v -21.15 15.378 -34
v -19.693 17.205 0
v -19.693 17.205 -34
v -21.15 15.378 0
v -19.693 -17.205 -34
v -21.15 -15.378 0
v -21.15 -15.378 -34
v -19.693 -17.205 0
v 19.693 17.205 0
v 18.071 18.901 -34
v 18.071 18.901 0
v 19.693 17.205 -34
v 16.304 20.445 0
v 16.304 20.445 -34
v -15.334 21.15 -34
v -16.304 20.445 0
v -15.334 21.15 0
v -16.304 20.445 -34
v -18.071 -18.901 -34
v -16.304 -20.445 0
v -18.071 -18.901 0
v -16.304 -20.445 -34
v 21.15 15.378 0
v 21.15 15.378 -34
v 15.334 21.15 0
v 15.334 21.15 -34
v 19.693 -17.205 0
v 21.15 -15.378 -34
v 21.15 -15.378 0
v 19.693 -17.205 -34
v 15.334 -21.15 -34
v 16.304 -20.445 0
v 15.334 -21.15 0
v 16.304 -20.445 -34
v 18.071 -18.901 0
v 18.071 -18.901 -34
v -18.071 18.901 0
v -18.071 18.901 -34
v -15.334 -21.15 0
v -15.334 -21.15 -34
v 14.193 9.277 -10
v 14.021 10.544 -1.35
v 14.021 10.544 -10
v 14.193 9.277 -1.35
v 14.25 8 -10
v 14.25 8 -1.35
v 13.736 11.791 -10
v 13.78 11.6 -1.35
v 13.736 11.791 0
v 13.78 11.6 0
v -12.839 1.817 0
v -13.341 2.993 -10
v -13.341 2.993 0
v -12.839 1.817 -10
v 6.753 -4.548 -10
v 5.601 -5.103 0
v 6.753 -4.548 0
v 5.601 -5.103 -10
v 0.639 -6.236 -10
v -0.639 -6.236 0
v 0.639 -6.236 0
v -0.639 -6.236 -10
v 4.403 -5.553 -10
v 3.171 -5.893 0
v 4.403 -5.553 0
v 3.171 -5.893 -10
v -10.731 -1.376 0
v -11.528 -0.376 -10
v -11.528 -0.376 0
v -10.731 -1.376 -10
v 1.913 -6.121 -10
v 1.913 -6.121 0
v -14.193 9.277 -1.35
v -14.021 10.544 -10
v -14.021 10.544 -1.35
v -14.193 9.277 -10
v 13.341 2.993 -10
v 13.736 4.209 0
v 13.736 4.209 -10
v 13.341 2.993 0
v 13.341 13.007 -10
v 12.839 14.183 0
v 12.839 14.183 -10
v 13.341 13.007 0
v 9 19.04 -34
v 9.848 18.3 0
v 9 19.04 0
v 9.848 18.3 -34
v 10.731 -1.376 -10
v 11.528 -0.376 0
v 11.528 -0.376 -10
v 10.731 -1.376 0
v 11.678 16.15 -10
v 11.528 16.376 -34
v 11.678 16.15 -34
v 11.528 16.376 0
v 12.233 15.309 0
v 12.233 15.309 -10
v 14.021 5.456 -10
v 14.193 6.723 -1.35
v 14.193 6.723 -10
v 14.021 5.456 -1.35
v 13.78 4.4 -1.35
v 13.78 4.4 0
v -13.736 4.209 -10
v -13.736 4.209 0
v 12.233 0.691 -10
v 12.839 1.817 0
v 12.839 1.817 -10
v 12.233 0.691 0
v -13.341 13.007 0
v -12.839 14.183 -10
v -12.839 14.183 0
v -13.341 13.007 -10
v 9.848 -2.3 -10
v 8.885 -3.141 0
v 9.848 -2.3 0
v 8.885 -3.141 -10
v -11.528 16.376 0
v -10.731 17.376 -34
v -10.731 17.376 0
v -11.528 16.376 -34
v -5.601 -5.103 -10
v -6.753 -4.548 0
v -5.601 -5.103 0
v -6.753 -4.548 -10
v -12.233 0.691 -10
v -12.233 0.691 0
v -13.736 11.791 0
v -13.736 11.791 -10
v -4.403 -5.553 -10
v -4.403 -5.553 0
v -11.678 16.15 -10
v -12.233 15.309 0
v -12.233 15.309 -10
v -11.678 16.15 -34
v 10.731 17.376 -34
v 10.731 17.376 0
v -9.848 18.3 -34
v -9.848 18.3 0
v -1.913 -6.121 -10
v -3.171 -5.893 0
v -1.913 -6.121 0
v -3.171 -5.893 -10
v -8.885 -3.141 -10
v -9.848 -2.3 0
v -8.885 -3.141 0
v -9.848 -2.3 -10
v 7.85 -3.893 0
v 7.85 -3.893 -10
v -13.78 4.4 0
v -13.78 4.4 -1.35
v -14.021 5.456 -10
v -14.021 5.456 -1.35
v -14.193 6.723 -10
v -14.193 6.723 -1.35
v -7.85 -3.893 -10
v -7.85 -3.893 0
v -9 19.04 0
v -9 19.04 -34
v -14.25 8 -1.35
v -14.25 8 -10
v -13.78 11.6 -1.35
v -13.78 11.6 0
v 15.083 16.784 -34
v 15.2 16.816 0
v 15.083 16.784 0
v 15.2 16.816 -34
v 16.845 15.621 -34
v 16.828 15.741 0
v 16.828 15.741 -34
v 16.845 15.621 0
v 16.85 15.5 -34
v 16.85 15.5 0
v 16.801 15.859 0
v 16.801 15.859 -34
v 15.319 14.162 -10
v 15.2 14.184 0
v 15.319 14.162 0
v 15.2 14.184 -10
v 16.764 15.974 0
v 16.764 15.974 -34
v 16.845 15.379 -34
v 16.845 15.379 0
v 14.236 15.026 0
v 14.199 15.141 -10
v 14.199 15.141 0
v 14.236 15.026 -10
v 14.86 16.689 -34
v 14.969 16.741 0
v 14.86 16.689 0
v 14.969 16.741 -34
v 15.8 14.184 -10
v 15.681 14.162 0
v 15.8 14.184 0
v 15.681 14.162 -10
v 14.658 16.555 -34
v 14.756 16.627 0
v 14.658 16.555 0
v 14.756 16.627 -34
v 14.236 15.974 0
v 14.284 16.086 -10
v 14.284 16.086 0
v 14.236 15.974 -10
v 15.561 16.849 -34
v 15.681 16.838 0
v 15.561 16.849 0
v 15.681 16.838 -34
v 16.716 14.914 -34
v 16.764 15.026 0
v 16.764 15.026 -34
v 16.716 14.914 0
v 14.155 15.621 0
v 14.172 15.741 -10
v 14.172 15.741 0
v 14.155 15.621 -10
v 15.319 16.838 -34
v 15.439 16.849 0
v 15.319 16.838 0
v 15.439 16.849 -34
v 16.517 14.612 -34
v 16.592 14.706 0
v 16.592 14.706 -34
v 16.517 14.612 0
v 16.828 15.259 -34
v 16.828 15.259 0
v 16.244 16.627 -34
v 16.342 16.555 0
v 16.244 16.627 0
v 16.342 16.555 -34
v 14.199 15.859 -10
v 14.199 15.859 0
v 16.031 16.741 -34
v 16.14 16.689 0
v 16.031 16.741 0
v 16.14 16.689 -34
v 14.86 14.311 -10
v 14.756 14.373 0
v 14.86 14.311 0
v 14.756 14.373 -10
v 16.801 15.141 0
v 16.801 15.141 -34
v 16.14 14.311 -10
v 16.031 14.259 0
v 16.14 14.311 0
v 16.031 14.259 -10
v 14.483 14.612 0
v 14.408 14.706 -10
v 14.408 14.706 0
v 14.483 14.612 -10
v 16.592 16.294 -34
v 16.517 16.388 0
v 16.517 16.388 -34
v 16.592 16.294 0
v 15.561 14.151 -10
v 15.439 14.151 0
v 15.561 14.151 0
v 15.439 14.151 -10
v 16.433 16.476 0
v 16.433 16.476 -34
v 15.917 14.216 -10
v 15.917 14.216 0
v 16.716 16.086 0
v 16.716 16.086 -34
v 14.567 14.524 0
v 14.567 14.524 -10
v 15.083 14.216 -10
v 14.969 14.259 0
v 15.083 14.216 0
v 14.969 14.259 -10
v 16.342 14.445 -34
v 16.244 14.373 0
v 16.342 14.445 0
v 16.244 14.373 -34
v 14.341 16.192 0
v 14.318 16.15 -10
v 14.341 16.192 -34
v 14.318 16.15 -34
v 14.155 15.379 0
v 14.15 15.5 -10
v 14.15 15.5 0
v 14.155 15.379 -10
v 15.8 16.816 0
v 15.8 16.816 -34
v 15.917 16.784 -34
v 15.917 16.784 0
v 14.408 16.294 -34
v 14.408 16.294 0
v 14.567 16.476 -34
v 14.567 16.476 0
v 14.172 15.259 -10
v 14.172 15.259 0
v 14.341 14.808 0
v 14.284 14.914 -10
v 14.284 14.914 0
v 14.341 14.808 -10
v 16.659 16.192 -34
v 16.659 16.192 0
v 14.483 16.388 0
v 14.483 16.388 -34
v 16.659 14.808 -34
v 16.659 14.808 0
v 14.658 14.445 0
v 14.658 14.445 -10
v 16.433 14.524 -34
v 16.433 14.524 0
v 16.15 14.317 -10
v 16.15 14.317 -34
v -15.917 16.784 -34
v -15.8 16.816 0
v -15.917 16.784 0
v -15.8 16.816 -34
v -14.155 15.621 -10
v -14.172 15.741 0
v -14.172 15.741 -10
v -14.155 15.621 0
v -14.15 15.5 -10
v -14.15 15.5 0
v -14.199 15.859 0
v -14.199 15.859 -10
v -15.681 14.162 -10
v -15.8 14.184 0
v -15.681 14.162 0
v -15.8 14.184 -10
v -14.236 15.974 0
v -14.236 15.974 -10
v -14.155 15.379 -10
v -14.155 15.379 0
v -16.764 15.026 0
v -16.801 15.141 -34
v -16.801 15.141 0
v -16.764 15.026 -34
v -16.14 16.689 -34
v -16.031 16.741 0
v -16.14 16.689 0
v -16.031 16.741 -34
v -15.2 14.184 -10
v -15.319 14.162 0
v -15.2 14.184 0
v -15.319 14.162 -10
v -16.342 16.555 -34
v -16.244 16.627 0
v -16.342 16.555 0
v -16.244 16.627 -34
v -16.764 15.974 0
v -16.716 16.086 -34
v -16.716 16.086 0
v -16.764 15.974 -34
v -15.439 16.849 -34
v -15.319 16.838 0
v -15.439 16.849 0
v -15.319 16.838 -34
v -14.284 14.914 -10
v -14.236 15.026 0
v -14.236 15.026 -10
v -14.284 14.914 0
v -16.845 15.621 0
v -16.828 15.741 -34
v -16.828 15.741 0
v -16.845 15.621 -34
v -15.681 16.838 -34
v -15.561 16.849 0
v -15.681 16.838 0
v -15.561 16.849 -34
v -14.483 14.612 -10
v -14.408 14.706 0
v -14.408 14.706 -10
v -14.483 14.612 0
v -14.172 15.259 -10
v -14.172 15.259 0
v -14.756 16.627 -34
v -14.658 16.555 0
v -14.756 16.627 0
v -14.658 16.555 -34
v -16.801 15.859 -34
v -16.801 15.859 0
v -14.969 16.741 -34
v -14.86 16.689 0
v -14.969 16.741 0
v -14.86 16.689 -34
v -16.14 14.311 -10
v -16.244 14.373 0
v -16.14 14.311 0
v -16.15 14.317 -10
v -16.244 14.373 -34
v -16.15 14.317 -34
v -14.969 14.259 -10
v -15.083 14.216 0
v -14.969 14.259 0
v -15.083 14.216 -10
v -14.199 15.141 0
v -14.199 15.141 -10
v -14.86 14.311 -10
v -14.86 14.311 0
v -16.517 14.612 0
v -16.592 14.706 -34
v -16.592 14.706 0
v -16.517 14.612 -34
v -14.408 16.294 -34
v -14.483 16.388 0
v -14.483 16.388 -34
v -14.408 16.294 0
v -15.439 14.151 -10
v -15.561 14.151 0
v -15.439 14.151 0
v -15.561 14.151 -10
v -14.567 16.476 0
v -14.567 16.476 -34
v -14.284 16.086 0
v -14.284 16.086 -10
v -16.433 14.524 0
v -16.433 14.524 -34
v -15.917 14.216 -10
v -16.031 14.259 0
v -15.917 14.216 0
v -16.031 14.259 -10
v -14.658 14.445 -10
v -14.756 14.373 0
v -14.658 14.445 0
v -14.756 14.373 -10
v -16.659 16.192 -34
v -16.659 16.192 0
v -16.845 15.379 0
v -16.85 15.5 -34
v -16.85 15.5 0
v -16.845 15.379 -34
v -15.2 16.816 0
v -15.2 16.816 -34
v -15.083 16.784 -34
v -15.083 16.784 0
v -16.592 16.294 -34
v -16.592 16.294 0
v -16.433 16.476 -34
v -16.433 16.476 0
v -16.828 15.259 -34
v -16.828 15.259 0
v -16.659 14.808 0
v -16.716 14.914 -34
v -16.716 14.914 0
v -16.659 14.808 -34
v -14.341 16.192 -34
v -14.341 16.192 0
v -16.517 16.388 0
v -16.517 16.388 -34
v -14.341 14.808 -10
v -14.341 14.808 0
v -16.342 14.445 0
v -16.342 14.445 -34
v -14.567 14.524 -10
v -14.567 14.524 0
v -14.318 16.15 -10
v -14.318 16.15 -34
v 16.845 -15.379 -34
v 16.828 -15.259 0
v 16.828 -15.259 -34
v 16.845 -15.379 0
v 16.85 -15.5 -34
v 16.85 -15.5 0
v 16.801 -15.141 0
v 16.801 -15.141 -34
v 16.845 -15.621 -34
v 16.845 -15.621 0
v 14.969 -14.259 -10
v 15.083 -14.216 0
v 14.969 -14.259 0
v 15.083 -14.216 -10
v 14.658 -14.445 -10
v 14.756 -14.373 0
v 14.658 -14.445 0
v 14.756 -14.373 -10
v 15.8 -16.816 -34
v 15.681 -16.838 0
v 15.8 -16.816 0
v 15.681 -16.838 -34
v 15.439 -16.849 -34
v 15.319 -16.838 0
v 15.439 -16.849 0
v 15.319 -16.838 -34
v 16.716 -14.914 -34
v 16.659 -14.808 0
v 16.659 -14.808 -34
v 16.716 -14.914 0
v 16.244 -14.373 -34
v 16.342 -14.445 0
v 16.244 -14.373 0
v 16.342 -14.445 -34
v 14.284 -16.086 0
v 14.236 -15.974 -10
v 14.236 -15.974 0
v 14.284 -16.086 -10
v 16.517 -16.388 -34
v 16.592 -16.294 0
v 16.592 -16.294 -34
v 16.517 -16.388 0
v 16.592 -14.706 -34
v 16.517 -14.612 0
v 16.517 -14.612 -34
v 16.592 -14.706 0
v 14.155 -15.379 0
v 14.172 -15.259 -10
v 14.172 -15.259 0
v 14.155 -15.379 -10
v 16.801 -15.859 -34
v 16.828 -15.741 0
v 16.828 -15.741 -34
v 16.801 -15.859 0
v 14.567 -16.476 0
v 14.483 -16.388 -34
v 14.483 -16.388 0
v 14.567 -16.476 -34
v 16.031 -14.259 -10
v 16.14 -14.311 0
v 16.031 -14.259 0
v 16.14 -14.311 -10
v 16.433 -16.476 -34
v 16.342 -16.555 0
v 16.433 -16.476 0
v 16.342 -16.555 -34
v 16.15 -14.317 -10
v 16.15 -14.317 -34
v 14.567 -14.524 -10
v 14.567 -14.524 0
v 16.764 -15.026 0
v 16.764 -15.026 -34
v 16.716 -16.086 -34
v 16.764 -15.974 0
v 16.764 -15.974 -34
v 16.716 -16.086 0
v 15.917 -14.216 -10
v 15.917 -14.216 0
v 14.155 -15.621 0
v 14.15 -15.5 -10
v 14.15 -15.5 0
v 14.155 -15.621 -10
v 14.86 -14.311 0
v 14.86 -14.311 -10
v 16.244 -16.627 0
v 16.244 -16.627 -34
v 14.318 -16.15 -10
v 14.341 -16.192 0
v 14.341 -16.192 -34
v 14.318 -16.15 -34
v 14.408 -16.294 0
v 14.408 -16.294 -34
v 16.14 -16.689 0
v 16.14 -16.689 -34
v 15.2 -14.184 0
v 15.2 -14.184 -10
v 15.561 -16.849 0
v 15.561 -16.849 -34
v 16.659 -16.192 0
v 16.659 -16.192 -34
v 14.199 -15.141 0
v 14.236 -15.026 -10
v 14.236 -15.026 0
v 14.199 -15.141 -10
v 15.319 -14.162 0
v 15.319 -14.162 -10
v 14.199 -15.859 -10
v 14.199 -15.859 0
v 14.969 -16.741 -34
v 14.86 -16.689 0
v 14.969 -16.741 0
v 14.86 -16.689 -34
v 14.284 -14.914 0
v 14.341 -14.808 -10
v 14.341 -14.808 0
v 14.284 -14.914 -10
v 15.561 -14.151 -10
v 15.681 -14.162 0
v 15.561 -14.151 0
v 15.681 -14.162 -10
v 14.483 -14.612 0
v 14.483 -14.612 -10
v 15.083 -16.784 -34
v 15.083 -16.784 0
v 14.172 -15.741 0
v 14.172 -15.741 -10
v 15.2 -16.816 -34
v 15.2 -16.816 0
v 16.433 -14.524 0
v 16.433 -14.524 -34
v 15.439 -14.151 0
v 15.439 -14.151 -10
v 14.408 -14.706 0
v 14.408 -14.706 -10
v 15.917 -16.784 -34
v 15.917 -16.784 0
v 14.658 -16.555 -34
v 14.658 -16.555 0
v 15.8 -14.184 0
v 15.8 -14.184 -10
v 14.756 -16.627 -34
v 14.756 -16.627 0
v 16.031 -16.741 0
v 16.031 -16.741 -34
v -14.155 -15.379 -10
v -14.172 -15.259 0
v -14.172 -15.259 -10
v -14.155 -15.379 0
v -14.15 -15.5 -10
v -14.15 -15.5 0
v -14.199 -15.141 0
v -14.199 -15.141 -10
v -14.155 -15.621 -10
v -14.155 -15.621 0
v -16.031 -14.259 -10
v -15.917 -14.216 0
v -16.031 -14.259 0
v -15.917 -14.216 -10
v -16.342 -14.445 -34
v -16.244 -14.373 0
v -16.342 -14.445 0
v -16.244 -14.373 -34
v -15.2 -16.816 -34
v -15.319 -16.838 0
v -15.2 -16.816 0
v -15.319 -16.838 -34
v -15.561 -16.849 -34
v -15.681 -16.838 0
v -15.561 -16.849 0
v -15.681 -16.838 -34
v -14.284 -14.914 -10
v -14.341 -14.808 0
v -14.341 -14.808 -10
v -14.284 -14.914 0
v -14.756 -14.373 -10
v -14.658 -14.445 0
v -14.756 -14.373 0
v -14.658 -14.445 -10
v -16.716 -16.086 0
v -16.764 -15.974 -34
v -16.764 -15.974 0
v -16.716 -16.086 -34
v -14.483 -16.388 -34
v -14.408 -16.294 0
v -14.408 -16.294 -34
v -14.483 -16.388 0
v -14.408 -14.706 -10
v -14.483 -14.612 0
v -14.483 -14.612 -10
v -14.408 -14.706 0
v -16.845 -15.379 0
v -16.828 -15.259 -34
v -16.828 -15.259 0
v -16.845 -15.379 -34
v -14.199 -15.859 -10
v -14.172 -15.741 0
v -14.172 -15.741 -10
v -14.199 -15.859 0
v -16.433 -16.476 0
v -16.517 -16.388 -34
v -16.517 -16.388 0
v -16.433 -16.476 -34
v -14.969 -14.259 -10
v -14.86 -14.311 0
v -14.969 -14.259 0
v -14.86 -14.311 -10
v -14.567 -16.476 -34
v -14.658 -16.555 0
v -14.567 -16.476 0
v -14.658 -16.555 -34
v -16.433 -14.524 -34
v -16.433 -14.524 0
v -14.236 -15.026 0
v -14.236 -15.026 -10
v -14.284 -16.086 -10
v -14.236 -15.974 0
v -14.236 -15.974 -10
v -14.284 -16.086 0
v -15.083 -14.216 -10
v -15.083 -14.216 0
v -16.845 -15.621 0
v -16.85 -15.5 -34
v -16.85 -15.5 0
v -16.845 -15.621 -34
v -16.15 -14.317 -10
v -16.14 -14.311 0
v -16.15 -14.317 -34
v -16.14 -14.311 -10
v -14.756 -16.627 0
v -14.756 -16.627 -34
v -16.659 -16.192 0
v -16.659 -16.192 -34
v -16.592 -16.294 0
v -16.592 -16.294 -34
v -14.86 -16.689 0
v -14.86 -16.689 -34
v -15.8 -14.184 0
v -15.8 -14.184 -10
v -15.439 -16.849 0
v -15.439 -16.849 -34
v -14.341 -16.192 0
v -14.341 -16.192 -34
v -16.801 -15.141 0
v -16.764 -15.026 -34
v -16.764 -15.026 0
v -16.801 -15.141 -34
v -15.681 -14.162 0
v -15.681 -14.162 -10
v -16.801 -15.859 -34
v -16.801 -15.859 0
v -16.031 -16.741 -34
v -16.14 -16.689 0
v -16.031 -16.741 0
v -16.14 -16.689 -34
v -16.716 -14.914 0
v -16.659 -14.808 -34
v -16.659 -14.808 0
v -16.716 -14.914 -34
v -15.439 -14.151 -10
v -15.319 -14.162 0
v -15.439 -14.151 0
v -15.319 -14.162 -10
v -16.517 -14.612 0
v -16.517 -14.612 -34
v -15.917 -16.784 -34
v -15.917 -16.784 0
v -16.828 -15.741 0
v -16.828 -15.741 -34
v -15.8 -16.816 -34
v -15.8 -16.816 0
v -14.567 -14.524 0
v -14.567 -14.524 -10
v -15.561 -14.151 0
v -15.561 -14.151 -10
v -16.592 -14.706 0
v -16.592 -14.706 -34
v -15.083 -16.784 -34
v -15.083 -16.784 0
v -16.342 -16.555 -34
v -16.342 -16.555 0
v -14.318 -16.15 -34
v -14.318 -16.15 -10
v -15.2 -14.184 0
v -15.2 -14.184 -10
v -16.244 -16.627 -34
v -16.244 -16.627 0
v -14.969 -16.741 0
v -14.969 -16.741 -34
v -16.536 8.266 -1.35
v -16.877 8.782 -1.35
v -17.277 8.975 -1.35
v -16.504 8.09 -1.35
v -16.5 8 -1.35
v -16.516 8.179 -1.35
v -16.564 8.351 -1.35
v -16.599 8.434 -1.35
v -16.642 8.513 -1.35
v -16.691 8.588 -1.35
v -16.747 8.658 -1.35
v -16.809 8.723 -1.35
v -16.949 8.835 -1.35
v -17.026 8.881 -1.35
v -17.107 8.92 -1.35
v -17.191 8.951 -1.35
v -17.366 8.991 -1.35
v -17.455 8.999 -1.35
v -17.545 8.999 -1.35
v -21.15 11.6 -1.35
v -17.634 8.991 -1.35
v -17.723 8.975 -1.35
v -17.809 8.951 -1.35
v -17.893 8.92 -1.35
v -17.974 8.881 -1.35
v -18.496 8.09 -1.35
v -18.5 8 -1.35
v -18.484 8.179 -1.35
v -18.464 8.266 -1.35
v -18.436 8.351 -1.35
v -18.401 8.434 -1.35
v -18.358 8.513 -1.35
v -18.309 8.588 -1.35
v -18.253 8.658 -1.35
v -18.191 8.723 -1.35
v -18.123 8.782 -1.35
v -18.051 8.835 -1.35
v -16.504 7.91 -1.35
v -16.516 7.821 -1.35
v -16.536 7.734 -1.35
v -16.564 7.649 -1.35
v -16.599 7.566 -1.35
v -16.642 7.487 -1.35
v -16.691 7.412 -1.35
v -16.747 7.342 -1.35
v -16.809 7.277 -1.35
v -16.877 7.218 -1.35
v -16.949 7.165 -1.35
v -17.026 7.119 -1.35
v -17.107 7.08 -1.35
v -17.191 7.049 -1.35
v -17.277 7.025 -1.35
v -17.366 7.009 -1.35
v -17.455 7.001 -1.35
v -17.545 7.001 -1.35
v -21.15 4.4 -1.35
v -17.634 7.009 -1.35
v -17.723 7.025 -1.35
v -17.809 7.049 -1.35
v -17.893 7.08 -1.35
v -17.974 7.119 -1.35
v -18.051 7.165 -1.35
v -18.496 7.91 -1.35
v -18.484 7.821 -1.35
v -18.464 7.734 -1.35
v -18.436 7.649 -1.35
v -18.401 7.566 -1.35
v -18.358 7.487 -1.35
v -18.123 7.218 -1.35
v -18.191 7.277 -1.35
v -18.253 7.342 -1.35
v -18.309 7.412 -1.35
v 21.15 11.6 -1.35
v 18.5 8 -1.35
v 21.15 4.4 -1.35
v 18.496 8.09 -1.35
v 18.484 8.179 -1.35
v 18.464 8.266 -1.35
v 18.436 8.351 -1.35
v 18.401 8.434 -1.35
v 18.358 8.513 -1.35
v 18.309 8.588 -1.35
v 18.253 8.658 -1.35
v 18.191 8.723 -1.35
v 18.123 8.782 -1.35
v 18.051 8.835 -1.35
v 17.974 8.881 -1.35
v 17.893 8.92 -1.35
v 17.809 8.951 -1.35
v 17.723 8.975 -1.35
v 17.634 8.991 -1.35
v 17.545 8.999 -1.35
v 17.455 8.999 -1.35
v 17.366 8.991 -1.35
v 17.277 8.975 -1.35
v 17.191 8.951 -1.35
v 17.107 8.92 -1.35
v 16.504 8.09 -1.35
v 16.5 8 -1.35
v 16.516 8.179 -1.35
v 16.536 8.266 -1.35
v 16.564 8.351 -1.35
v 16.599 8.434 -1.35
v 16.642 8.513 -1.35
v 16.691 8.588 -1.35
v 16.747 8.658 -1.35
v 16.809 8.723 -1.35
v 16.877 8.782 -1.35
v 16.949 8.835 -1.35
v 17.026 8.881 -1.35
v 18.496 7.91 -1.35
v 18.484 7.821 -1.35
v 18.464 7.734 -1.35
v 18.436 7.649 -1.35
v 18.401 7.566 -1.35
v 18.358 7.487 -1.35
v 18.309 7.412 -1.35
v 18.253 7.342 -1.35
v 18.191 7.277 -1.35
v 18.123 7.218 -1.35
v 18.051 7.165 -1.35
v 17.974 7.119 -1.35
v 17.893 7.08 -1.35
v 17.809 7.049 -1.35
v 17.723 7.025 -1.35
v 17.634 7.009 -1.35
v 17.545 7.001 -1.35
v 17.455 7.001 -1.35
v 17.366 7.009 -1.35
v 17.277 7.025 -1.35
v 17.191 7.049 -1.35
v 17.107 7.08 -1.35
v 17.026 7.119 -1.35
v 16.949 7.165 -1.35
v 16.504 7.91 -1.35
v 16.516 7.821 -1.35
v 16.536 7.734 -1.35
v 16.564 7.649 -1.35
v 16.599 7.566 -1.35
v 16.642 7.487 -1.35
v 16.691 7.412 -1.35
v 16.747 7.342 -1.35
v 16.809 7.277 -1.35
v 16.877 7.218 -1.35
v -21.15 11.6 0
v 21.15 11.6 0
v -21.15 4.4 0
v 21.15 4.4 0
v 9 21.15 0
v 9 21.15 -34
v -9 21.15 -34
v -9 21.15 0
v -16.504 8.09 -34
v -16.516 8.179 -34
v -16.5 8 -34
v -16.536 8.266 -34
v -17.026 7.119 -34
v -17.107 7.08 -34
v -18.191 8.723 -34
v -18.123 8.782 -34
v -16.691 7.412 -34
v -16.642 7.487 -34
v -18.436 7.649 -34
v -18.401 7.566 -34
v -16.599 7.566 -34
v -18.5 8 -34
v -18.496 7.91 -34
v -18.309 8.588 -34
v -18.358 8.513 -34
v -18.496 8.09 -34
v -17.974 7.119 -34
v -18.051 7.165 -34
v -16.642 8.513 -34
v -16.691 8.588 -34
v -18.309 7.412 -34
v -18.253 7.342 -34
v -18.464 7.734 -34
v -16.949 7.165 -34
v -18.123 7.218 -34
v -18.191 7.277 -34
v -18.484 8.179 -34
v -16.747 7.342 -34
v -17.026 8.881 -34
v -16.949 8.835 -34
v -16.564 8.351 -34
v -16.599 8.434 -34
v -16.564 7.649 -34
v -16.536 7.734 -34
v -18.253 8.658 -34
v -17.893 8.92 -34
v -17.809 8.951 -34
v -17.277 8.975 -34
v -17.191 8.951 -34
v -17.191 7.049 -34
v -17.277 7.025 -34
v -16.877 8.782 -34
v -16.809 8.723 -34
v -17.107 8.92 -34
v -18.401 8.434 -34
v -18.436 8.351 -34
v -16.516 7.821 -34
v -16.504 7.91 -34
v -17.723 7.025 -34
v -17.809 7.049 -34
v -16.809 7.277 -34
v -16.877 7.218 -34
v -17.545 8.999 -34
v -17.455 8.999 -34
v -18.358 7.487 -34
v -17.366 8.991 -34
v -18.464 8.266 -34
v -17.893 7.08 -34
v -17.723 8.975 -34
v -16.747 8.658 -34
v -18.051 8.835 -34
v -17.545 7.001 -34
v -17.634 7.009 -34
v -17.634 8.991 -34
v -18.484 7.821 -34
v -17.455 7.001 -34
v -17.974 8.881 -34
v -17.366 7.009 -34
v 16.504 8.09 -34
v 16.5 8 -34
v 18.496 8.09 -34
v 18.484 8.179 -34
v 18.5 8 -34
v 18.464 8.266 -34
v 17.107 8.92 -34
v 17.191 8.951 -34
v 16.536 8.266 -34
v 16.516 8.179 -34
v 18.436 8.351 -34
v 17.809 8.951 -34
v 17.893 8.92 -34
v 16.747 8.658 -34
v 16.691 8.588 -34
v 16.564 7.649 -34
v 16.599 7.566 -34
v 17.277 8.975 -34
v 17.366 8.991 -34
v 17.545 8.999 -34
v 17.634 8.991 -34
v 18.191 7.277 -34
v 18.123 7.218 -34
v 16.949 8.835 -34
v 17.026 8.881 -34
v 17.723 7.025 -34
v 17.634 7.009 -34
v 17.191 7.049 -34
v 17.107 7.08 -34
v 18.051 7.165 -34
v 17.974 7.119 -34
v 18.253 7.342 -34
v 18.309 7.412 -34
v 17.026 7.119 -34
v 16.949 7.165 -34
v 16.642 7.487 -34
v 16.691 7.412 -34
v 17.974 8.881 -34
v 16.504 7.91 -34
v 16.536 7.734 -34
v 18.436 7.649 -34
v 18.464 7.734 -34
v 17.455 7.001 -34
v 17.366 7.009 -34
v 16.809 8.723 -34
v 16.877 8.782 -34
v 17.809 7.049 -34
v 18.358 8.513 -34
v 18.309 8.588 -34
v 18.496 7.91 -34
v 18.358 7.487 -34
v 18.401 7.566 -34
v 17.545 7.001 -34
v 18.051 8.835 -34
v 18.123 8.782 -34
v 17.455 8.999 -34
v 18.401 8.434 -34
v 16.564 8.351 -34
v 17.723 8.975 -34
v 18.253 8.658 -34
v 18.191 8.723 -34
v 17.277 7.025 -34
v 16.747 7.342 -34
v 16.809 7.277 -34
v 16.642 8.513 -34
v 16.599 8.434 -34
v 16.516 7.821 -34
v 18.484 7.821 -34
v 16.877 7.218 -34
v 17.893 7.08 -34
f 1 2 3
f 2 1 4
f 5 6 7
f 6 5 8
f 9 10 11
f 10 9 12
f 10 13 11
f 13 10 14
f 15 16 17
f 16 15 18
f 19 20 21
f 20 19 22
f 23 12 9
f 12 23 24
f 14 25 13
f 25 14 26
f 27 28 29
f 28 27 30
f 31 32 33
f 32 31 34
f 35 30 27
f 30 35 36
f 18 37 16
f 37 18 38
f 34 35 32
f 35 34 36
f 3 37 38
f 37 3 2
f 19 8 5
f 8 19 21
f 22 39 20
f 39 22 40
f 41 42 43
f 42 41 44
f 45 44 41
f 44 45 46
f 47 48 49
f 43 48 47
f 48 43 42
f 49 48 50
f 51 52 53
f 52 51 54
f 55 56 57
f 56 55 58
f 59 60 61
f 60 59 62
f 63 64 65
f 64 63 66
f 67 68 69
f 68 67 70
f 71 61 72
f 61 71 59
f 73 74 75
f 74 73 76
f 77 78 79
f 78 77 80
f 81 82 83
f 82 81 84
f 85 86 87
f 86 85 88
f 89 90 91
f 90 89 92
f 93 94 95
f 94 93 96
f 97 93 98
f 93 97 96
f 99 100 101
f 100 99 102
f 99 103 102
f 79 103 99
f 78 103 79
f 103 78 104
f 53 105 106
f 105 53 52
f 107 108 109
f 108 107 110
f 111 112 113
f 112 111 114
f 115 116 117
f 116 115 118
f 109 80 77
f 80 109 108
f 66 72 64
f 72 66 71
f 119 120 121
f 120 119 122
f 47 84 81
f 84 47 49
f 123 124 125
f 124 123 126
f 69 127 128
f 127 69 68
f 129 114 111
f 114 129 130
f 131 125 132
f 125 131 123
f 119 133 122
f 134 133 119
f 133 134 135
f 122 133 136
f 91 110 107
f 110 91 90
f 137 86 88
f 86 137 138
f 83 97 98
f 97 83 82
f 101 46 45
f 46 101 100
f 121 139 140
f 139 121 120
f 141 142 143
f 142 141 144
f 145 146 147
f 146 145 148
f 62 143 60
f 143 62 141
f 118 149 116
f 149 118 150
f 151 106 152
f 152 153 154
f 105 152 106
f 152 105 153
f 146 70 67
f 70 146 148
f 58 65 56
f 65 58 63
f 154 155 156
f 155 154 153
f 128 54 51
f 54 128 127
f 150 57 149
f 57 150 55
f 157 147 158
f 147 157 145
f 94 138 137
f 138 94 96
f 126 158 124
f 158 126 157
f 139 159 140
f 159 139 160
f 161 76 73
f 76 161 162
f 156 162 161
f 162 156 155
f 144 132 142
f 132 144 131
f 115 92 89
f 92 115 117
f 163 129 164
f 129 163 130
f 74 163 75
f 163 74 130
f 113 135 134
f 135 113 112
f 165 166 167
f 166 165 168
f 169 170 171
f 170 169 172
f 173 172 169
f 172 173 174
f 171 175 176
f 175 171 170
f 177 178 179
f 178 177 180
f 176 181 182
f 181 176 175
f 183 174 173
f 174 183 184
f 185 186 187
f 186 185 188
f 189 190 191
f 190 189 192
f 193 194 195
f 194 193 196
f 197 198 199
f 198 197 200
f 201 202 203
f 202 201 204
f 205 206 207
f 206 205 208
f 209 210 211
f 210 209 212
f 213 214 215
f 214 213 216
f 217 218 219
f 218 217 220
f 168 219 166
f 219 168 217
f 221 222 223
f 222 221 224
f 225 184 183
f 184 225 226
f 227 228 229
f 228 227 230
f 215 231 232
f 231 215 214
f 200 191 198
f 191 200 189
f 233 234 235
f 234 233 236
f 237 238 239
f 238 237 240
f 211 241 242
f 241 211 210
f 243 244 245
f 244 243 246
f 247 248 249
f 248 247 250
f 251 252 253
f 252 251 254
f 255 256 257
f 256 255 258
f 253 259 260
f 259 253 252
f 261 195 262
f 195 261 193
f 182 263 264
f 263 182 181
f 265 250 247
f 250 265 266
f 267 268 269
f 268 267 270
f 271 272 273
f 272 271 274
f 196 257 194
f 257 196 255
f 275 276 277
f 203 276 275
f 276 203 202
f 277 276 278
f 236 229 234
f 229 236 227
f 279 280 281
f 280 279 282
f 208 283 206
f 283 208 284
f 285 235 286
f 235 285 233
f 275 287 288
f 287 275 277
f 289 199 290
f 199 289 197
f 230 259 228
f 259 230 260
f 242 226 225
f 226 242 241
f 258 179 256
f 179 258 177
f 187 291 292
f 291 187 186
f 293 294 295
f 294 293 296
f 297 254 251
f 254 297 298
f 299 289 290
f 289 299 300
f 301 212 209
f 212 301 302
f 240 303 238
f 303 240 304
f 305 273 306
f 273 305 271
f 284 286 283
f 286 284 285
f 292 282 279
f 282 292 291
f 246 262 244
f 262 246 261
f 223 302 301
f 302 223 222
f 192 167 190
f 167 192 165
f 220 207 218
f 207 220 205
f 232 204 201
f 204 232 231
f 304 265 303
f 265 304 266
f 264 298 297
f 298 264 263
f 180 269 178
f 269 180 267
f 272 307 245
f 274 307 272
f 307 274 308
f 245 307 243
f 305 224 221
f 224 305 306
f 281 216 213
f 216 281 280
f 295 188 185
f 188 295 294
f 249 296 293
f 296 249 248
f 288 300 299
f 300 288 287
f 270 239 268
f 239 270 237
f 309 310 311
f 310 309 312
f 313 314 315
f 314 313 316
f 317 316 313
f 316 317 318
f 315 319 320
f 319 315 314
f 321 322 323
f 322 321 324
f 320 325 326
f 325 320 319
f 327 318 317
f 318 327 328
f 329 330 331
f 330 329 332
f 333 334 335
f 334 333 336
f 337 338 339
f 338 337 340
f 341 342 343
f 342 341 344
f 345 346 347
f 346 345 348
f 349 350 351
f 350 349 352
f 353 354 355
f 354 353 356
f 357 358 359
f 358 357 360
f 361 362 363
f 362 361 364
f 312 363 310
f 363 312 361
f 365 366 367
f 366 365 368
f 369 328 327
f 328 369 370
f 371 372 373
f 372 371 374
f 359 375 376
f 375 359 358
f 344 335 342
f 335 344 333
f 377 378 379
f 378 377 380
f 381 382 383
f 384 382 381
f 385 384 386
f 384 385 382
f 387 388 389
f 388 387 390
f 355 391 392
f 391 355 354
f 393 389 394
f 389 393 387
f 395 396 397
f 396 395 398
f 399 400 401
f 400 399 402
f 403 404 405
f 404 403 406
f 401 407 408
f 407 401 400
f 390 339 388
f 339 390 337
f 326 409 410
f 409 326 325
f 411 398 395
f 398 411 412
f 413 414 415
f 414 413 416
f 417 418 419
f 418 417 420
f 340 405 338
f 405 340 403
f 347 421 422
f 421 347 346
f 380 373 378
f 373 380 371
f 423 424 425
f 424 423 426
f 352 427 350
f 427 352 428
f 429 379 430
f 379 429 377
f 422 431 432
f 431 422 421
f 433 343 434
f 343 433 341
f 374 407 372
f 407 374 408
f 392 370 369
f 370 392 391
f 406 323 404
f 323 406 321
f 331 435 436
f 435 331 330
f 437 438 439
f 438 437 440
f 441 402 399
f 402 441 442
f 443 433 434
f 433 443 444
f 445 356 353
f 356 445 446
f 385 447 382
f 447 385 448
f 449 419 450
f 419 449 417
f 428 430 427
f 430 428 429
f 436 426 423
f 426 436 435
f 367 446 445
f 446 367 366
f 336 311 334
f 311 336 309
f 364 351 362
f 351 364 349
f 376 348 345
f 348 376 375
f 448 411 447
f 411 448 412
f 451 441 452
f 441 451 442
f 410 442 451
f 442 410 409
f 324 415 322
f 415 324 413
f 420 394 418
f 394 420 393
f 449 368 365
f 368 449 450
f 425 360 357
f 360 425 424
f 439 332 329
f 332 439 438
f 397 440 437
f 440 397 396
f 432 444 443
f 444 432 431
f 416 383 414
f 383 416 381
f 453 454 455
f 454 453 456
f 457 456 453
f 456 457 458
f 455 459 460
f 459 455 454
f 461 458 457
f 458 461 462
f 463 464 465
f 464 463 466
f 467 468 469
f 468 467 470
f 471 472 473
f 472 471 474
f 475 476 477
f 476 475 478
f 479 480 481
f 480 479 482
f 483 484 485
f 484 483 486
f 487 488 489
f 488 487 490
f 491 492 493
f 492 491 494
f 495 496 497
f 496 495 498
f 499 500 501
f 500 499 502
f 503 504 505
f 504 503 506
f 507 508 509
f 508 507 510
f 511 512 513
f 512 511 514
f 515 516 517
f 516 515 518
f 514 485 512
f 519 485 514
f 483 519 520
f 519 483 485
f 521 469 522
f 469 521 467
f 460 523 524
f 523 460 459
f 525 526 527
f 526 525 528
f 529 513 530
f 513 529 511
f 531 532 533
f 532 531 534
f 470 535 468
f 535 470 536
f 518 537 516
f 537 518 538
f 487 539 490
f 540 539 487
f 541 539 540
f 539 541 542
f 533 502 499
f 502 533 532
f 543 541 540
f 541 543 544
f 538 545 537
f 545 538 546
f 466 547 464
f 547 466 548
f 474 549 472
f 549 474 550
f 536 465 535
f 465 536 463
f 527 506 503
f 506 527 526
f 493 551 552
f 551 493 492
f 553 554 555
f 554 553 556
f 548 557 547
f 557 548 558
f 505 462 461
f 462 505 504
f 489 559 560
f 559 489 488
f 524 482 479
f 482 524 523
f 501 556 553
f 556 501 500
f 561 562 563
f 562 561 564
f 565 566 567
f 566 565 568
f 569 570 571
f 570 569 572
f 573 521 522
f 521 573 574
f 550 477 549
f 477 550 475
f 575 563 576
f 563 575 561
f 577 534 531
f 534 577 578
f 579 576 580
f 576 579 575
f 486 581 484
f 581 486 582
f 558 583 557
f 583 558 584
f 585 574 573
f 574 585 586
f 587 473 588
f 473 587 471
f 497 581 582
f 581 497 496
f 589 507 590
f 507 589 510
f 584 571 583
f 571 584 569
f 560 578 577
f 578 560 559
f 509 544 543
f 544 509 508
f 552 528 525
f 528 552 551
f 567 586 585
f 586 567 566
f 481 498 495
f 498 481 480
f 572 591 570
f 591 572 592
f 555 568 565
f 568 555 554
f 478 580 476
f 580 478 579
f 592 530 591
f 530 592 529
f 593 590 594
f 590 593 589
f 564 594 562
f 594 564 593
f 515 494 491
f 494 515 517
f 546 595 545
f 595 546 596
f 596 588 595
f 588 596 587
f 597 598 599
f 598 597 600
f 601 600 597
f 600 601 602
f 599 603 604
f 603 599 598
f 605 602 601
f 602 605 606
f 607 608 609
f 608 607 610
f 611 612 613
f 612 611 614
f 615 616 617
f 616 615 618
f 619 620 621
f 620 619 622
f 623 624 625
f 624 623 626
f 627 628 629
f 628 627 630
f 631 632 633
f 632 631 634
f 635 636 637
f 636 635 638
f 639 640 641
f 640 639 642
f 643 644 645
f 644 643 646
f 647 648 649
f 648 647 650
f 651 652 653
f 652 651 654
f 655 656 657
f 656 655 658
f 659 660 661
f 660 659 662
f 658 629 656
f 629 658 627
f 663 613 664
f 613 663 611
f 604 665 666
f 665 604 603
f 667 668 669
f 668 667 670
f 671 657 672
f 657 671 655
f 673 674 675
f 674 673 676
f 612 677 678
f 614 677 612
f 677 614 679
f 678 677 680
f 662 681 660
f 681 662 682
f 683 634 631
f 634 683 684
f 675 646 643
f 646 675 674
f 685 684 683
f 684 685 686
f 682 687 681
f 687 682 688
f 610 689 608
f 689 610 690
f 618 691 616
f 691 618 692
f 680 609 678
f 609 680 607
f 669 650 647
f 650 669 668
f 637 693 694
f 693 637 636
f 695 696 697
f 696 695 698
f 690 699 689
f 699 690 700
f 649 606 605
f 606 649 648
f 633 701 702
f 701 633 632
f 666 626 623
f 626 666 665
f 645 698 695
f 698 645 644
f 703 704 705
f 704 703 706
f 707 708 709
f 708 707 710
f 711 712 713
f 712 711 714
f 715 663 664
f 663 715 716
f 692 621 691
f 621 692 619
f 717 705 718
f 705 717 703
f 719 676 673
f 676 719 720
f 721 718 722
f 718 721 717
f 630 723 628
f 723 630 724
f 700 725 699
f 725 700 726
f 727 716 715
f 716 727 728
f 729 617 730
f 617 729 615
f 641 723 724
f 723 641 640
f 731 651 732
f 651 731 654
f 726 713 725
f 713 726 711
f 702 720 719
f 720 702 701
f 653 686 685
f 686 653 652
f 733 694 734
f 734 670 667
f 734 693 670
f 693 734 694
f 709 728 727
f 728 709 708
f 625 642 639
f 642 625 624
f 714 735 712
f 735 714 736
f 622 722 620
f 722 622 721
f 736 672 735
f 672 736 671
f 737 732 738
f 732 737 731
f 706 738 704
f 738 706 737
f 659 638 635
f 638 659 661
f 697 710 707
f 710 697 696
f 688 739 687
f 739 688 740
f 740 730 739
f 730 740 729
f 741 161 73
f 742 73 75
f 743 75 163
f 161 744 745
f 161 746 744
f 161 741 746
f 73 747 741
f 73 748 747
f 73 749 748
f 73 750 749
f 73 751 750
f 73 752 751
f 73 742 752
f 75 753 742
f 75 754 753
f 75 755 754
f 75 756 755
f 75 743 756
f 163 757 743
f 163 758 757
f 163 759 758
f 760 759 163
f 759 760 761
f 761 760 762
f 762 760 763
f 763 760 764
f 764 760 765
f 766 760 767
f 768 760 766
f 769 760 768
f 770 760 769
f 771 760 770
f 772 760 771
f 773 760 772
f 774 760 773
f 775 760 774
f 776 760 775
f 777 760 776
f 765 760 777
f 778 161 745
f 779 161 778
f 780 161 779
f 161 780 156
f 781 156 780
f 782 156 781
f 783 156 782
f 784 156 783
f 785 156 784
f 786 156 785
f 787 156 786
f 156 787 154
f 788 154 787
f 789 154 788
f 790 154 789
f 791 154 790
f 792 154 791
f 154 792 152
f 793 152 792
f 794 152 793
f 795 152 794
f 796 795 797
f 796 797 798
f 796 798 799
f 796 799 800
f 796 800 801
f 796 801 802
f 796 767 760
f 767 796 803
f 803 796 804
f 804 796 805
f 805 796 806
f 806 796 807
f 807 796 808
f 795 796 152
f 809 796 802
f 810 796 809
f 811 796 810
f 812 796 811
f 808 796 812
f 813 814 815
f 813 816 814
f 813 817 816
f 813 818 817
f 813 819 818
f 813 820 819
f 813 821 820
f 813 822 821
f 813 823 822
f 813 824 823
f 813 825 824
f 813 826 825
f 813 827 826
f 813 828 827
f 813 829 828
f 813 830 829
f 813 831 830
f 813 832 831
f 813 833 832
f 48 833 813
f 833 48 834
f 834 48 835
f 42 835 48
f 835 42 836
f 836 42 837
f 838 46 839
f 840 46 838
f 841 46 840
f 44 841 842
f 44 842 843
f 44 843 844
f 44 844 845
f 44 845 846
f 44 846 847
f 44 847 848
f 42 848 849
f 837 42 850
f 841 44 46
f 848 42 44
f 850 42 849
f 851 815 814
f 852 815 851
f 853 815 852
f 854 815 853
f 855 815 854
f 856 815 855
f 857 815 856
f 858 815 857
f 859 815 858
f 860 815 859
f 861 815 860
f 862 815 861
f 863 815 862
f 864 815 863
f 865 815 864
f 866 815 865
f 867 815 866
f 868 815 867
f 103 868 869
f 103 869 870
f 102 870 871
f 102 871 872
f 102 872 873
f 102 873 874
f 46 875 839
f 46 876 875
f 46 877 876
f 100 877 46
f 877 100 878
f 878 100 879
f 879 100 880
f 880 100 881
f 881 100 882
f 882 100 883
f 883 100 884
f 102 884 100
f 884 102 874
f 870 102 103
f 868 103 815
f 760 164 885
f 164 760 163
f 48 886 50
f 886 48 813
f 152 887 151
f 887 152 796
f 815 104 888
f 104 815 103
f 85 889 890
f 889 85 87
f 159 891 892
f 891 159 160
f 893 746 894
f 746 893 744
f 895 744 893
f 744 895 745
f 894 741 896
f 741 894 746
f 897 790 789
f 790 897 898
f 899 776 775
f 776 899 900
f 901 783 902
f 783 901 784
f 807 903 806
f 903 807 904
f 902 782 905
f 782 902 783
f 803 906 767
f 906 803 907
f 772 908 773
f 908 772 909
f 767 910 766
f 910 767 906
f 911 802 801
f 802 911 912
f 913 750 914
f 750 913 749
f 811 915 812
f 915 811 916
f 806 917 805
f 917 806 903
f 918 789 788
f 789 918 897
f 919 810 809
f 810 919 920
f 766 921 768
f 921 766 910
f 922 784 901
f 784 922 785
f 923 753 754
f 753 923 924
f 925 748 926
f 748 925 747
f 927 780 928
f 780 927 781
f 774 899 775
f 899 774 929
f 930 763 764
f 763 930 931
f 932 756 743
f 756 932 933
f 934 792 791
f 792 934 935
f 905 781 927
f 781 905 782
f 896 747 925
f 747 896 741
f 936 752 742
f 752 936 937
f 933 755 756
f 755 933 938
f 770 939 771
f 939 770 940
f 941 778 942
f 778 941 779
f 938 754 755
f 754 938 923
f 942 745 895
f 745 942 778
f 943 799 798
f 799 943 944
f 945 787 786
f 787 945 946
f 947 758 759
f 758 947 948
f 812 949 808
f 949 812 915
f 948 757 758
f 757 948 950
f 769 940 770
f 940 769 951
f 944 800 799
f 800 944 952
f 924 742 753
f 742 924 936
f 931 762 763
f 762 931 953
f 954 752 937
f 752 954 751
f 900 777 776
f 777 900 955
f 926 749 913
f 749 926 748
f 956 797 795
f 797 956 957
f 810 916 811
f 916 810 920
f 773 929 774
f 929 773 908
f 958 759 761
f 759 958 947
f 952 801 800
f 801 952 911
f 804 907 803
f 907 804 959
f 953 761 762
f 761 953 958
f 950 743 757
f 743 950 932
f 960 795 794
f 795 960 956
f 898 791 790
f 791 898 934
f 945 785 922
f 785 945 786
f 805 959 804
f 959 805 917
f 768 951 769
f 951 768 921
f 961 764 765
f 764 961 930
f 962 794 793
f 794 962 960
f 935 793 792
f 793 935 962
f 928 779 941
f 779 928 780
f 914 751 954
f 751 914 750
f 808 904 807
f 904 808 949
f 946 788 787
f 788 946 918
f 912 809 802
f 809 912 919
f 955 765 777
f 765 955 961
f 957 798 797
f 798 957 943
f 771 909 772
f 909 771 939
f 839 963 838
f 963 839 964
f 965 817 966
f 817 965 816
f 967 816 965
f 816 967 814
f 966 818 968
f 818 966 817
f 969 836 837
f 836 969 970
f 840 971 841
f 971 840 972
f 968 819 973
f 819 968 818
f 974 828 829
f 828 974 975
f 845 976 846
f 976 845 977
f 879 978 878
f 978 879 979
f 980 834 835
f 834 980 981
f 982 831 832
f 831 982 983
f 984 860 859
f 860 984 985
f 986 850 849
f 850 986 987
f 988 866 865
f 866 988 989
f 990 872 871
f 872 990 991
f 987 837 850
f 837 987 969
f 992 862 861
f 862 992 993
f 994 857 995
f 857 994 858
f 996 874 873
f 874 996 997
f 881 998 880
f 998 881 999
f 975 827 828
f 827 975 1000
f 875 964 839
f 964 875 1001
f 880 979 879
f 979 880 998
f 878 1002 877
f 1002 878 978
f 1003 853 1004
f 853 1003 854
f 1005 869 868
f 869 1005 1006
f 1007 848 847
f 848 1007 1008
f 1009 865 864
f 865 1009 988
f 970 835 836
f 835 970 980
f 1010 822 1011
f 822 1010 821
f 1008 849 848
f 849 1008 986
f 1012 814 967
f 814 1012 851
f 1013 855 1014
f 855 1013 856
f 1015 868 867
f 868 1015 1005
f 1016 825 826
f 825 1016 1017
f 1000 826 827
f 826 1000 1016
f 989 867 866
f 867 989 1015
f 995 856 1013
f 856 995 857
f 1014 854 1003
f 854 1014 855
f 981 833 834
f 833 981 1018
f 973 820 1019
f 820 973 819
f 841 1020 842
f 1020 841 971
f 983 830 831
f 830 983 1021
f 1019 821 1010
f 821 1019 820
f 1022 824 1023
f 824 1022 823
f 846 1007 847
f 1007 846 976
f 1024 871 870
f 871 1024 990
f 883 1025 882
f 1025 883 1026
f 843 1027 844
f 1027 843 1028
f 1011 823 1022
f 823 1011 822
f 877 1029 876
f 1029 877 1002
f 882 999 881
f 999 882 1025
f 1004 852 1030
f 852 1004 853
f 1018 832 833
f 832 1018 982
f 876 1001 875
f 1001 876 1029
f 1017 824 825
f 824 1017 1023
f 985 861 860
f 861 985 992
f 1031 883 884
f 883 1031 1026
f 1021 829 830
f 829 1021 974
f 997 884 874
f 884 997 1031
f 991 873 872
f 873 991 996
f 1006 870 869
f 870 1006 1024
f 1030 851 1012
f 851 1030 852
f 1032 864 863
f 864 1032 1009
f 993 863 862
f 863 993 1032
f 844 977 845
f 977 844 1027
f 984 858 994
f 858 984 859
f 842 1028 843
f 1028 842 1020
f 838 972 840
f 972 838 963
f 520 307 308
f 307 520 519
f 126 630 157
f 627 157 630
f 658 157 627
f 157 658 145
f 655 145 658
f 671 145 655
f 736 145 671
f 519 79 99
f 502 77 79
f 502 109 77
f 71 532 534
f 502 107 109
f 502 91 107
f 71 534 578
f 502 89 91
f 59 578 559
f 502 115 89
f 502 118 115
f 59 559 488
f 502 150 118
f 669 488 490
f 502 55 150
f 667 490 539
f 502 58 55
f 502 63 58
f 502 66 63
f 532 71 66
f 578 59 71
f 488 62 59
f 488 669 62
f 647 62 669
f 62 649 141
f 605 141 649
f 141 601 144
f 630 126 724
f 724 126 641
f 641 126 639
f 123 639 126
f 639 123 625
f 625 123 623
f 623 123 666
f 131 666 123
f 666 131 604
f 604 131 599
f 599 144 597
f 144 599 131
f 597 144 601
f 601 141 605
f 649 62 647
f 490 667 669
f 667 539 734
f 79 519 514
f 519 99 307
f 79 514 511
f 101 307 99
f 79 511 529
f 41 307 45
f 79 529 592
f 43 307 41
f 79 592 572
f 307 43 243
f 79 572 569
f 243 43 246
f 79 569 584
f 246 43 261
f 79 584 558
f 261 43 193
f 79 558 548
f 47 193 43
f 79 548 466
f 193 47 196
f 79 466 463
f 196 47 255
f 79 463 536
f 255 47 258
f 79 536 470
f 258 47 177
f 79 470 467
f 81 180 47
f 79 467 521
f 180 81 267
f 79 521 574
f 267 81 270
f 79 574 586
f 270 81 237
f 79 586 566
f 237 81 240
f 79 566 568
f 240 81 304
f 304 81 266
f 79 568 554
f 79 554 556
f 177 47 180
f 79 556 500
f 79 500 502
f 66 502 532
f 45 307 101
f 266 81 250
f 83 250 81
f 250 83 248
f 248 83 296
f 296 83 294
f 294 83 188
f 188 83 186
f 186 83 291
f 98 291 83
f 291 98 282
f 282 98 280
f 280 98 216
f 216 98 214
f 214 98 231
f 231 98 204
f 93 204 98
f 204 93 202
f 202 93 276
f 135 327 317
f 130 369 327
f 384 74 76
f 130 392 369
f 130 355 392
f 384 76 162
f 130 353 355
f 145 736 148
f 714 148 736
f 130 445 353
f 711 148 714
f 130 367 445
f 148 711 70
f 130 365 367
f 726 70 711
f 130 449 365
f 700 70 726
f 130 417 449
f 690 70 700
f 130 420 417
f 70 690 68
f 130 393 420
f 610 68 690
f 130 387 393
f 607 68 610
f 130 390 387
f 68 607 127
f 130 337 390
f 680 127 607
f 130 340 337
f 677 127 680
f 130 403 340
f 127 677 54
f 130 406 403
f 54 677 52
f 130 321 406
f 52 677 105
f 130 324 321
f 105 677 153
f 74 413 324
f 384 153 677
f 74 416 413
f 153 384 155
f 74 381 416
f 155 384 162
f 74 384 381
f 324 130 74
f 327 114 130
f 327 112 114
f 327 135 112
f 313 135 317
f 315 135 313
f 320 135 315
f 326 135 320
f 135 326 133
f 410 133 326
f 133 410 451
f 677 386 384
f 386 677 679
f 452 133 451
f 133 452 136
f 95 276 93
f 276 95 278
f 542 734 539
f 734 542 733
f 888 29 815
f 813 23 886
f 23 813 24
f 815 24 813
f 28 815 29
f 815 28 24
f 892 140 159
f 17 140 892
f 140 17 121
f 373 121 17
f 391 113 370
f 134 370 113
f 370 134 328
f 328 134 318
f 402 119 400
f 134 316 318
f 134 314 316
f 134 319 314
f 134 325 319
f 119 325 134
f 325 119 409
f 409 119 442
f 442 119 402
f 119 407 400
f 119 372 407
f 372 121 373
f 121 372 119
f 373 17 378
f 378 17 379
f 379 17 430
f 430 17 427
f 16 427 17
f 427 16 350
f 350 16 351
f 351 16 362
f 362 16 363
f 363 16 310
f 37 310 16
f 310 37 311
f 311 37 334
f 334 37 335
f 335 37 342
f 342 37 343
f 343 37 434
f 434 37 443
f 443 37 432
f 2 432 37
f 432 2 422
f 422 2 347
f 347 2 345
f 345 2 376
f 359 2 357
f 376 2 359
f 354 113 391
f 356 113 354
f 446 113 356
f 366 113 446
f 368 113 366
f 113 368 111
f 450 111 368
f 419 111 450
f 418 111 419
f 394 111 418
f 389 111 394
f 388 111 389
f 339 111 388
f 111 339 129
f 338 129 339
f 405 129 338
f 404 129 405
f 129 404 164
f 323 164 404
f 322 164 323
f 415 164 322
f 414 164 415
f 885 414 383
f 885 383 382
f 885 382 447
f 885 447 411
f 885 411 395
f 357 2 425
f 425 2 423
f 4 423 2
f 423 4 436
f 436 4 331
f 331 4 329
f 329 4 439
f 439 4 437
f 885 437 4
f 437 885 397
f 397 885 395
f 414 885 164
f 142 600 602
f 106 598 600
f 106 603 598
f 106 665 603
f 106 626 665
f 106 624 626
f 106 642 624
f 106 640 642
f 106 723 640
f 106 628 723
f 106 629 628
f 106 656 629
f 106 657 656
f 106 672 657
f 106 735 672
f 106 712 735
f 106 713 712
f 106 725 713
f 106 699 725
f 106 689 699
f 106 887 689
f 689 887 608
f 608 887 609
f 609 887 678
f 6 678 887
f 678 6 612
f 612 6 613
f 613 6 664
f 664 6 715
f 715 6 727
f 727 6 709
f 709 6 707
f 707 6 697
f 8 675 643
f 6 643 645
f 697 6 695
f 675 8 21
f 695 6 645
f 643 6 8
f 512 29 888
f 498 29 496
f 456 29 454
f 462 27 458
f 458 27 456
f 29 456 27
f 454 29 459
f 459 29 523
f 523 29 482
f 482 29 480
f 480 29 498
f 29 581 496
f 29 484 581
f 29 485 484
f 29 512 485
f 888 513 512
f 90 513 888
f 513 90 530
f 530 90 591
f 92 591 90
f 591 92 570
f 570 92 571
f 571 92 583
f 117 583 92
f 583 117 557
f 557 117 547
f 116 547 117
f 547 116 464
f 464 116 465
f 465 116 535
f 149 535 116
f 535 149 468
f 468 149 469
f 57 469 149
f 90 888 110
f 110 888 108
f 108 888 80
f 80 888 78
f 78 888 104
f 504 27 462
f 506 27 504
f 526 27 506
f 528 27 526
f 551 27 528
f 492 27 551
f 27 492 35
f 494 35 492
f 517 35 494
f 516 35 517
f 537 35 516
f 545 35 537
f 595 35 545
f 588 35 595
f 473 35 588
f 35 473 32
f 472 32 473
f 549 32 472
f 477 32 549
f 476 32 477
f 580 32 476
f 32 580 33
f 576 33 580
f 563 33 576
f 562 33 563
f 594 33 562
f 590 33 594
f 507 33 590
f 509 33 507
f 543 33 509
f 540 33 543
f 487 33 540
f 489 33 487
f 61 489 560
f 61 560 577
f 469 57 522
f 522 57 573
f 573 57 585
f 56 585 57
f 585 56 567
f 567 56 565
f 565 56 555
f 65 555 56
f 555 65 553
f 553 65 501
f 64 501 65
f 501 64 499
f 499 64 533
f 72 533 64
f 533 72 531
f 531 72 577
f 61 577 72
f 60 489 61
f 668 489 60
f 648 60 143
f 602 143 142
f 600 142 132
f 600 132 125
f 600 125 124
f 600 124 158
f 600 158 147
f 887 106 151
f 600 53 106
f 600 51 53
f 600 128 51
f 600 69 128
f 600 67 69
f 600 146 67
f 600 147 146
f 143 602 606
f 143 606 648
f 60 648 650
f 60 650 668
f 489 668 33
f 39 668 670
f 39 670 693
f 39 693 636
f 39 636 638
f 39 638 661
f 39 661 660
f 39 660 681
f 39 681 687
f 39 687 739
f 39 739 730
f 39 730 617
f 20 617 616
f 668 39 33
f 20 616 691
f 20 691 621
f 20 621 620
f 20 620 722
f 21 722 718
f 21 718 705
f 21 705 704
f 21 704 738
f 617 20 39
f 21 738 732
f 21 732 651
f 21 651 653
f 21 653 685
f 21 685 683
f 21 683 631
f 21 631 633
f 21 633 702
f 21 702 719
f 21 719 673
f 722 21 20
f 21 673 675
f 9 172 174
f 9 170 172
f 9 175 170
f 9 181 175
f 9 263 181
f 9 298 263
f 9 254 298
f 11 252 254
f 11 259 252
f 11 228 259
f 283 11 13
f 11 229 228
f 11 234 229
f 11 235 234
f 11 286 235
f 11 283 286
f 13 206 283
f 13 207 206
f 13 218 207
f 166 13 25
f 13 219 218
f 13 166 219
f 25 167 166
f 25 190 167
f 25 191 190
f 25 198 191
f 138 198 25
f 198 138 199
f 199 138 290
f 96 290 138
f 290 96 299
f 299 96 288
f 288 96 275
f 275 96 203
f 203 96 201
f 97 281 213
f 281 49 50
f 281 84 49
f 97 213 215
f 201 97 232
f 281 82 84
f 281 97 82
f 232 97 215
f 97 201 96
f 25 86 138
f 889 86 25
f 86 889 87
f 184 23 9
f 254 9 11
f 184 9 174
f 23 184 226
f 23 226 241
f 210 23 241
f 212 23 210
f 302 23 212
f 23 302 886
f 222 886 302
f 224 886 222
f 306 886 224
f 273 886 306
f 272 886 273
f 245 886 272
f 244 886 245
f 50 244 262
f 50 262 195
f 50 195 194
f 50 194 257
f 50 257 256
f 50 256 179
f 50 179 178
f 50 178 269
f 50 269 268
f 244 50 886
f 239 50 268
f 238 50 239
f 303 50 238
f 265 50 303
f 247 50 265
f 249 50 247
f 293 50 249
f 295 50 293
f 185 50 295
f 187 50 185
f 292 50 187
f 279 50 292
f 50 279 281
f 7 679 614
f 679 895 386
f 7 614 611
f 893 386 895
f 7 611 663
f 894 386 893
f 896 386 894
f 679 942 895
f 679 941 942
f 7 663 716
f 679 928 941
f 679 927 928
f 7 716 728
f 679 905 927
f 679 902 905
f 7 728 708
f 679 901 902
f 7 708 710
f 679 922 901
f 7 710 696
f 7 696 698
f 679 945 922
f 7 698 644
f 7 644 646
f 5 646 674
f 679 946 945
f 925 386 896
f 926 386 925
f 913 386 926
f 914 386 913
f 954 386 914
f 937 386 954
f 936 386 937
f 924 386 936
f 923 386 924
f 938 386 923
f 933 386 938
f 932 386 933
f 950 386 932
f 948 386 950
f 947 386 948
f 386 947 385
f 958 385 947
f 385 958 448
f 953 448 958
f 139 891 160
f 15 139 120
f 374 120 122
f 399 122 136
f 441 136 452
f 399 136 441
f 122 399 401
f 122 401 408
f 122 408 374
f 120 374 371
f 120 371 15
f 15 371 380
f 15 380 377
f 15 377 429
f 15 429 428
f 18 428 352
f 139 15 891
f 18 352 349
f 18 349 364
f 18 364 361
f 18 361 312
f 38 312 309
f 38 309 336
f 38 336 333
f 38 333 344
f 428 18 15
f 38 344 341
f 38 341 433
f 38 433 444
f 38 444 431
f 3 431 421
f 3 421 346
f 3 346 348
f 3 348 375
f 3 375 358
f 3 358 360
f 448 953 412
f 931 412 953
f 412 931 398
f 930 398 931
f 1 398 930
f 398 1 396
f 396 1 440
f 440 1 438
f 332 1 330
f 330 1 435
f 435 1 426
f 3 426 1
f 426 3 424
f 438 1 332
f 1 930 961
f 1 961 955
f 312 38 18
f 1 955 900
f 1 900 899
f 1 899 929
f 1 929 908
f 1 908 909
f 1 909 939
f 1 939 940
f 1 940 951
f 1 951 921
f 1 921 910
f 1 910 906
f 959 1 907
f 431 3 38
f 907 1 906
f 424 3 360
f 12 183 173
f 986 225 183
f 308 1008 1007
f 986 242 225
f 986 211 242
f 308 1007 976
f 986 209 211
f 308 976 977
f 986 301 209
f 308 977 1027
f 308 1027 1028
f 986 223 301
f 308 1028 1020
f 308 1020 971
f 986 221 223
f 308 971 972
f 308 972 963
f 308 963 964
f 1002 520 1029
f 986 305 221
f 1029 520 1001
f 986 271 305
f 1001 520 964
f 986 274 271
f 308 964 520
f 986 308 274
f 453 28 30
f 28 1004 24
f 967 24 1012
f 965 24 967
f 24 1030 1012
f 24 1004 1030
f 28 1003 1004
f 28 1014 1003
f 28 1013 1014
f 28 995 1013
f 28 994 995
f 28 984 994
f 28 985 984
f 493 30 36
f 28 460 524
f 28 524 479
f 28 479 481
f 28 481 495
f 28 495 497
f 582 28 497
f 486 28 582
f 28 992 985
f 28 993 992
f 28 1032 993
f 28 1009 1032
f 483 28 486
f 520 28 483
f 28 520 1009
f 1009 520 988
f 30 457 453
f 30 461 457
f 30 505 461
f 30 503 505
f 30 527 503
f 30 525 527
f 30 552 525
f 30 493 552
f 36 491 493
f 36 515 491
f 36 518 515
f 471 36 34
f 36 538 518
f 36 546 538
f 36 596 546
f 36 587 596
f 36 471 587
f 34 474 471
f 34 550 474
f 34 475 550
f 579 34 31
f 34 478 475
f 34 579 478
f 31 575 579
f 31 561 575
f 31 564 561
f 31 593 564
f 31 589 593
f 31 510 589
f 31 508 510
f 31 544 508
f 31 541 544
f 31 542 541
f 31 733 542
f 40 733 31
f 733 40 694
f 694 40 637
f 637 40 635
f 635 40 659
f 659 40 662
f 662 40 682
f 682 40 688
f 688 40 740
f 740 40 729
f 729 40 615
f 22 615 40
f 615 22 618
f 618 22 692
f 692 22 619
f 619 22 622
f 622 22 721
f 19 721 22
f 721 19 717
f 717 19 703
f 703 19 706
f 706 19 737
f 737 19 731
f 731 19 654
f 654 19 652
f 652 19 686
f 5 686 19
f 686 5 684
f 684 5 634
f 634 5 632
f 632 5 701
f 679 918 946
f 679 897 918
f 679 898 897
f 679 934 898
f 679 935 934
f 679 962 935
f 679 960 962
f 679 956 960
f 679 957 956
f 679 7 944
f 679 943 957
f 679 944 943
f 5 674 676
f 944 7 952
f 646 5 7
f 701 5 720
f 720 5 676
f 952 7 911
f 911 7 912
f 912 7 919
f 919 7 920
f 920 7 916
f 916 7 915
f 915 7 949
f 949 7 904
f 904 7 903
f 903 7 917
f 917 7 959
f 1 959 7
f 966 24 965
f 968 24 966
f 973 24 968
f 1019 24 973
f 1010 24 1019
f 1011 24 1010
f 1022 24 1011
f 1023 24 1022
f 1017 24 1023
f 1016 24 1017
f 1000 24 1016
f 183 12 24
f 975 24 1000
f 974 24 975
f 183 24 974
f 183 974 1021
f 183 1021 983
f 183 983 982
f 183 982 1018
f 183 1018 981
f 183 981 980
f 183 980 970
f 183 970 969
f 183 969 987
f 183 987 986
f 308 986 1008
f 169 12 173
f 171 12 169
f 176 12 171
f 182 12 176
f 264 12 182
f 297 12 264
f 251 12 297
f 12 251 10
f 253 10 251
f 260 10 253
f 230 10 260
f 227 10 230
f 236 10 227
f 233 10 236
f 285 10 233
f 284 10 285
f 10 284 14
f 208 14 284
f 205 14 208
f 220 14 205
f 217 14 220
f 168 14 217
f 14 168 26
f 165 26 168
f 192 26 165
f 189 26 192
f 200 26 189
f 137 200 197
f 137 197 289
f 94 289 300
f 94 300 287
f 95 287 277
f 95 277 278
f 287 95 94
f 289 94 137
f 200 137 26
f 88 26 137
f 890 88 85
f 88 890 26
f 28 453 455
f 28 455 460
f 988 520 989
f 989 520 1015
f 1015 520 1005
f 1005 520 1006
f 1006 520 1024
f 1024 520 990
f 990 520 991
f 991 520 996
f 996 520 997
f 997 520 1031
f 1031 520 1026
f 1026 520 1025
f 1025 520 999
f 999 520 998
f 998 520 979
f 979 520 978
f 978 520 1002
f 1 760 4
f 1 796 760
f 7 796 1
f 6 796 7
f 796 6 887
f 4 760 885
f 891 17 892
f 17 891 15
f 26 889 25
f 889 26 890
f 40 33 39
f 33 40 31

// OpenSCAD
/* 
***************************************************************************
    Adapter from motor 28BY-48 to motor 17HS
    Copyright (C) 2016 Andrey Kostin

    This program is free software: you can redistribute it and/or modify
    it under the terms of the GNU General Public License as published by
    the Free Software Foundation, either version 3 of the License, or
     any later version.

    This program is distributed in the hope that it will be useful,
    but WITHOUT ANY WARRANTY.
    See the GNU General Public License for more details.

************************************************************************* 
*/

//height motor
ht = 34;//17HS42

//width motor
a = 42.3; //17HS42

//distance from hole to surface motor
kd =5.65;

$fn = 70;

difference(){   
    
translate(v=[0,0,-ht/2]){
cube([a,a,ht], center=true);
}
union(){        
    
//case 28BY-48
translate(v=[0,8,-(ht+1)]){
cylinder(h=ht+2,r=28.5/2,r2=28.5/2);
}
translate(v=[((a/2)-kd),((a/2)-kd),-(ht+1)]){
cylinder(h=ht+2,r=2.7/2,r2=2.7/2);
}
translate(v=[-((a/2)-kd),((a/2)-kd),-(ht+1)]){
cylinder(h=ht+2,r=2.7/2,r2=2.7/2);
}
translate(v=[((a/2)-kd),-((a/2)-kd),-(ht+1)]){
cylinder(h=ht+2,r=2.7/2,r2=2.7/2);
}
translate(v=[-((a/2)-kd),-((a/2)-kd),-(ht+1)]){
cylinder(h=ht+2,r=2.7/2,r2=2.7/2);
}
//mount 28BY-48
translate(v=[0,8,-1/2]){
cube([a+2,7.2,1.7], center=true);
}
//side box 28BY-48
translate(v=[0,((28.5/2)+8),-(ht/2)]){
cube([18,8,(ht+2)], center=true);
}
//the bolts 28BY-48
translate(v=[-35/2,8,-(ht+2)]){
cylinder(h=ht+4,r=1,r2=1);
}
translate(v=[35/2,8,-(ht+2)]){
cylinder(h=ht+4,r=1,r2=1);
}
translate(v=[0,0,-((ht/2)+10)]){
cube([(a-10),(a-10),ht], center=true);
}
//cylinder for smooth edges
difference(){   
translate(v=[0,0,-(ht+1)]){    
cylinder(h=ht+4,r=a+5,r2=a+5);
}
translate(v=[0,0,-(ht+2)]){
cylinder(h=ht+6,r=a/2+5,r2=a/2+5);}
}
}
}
